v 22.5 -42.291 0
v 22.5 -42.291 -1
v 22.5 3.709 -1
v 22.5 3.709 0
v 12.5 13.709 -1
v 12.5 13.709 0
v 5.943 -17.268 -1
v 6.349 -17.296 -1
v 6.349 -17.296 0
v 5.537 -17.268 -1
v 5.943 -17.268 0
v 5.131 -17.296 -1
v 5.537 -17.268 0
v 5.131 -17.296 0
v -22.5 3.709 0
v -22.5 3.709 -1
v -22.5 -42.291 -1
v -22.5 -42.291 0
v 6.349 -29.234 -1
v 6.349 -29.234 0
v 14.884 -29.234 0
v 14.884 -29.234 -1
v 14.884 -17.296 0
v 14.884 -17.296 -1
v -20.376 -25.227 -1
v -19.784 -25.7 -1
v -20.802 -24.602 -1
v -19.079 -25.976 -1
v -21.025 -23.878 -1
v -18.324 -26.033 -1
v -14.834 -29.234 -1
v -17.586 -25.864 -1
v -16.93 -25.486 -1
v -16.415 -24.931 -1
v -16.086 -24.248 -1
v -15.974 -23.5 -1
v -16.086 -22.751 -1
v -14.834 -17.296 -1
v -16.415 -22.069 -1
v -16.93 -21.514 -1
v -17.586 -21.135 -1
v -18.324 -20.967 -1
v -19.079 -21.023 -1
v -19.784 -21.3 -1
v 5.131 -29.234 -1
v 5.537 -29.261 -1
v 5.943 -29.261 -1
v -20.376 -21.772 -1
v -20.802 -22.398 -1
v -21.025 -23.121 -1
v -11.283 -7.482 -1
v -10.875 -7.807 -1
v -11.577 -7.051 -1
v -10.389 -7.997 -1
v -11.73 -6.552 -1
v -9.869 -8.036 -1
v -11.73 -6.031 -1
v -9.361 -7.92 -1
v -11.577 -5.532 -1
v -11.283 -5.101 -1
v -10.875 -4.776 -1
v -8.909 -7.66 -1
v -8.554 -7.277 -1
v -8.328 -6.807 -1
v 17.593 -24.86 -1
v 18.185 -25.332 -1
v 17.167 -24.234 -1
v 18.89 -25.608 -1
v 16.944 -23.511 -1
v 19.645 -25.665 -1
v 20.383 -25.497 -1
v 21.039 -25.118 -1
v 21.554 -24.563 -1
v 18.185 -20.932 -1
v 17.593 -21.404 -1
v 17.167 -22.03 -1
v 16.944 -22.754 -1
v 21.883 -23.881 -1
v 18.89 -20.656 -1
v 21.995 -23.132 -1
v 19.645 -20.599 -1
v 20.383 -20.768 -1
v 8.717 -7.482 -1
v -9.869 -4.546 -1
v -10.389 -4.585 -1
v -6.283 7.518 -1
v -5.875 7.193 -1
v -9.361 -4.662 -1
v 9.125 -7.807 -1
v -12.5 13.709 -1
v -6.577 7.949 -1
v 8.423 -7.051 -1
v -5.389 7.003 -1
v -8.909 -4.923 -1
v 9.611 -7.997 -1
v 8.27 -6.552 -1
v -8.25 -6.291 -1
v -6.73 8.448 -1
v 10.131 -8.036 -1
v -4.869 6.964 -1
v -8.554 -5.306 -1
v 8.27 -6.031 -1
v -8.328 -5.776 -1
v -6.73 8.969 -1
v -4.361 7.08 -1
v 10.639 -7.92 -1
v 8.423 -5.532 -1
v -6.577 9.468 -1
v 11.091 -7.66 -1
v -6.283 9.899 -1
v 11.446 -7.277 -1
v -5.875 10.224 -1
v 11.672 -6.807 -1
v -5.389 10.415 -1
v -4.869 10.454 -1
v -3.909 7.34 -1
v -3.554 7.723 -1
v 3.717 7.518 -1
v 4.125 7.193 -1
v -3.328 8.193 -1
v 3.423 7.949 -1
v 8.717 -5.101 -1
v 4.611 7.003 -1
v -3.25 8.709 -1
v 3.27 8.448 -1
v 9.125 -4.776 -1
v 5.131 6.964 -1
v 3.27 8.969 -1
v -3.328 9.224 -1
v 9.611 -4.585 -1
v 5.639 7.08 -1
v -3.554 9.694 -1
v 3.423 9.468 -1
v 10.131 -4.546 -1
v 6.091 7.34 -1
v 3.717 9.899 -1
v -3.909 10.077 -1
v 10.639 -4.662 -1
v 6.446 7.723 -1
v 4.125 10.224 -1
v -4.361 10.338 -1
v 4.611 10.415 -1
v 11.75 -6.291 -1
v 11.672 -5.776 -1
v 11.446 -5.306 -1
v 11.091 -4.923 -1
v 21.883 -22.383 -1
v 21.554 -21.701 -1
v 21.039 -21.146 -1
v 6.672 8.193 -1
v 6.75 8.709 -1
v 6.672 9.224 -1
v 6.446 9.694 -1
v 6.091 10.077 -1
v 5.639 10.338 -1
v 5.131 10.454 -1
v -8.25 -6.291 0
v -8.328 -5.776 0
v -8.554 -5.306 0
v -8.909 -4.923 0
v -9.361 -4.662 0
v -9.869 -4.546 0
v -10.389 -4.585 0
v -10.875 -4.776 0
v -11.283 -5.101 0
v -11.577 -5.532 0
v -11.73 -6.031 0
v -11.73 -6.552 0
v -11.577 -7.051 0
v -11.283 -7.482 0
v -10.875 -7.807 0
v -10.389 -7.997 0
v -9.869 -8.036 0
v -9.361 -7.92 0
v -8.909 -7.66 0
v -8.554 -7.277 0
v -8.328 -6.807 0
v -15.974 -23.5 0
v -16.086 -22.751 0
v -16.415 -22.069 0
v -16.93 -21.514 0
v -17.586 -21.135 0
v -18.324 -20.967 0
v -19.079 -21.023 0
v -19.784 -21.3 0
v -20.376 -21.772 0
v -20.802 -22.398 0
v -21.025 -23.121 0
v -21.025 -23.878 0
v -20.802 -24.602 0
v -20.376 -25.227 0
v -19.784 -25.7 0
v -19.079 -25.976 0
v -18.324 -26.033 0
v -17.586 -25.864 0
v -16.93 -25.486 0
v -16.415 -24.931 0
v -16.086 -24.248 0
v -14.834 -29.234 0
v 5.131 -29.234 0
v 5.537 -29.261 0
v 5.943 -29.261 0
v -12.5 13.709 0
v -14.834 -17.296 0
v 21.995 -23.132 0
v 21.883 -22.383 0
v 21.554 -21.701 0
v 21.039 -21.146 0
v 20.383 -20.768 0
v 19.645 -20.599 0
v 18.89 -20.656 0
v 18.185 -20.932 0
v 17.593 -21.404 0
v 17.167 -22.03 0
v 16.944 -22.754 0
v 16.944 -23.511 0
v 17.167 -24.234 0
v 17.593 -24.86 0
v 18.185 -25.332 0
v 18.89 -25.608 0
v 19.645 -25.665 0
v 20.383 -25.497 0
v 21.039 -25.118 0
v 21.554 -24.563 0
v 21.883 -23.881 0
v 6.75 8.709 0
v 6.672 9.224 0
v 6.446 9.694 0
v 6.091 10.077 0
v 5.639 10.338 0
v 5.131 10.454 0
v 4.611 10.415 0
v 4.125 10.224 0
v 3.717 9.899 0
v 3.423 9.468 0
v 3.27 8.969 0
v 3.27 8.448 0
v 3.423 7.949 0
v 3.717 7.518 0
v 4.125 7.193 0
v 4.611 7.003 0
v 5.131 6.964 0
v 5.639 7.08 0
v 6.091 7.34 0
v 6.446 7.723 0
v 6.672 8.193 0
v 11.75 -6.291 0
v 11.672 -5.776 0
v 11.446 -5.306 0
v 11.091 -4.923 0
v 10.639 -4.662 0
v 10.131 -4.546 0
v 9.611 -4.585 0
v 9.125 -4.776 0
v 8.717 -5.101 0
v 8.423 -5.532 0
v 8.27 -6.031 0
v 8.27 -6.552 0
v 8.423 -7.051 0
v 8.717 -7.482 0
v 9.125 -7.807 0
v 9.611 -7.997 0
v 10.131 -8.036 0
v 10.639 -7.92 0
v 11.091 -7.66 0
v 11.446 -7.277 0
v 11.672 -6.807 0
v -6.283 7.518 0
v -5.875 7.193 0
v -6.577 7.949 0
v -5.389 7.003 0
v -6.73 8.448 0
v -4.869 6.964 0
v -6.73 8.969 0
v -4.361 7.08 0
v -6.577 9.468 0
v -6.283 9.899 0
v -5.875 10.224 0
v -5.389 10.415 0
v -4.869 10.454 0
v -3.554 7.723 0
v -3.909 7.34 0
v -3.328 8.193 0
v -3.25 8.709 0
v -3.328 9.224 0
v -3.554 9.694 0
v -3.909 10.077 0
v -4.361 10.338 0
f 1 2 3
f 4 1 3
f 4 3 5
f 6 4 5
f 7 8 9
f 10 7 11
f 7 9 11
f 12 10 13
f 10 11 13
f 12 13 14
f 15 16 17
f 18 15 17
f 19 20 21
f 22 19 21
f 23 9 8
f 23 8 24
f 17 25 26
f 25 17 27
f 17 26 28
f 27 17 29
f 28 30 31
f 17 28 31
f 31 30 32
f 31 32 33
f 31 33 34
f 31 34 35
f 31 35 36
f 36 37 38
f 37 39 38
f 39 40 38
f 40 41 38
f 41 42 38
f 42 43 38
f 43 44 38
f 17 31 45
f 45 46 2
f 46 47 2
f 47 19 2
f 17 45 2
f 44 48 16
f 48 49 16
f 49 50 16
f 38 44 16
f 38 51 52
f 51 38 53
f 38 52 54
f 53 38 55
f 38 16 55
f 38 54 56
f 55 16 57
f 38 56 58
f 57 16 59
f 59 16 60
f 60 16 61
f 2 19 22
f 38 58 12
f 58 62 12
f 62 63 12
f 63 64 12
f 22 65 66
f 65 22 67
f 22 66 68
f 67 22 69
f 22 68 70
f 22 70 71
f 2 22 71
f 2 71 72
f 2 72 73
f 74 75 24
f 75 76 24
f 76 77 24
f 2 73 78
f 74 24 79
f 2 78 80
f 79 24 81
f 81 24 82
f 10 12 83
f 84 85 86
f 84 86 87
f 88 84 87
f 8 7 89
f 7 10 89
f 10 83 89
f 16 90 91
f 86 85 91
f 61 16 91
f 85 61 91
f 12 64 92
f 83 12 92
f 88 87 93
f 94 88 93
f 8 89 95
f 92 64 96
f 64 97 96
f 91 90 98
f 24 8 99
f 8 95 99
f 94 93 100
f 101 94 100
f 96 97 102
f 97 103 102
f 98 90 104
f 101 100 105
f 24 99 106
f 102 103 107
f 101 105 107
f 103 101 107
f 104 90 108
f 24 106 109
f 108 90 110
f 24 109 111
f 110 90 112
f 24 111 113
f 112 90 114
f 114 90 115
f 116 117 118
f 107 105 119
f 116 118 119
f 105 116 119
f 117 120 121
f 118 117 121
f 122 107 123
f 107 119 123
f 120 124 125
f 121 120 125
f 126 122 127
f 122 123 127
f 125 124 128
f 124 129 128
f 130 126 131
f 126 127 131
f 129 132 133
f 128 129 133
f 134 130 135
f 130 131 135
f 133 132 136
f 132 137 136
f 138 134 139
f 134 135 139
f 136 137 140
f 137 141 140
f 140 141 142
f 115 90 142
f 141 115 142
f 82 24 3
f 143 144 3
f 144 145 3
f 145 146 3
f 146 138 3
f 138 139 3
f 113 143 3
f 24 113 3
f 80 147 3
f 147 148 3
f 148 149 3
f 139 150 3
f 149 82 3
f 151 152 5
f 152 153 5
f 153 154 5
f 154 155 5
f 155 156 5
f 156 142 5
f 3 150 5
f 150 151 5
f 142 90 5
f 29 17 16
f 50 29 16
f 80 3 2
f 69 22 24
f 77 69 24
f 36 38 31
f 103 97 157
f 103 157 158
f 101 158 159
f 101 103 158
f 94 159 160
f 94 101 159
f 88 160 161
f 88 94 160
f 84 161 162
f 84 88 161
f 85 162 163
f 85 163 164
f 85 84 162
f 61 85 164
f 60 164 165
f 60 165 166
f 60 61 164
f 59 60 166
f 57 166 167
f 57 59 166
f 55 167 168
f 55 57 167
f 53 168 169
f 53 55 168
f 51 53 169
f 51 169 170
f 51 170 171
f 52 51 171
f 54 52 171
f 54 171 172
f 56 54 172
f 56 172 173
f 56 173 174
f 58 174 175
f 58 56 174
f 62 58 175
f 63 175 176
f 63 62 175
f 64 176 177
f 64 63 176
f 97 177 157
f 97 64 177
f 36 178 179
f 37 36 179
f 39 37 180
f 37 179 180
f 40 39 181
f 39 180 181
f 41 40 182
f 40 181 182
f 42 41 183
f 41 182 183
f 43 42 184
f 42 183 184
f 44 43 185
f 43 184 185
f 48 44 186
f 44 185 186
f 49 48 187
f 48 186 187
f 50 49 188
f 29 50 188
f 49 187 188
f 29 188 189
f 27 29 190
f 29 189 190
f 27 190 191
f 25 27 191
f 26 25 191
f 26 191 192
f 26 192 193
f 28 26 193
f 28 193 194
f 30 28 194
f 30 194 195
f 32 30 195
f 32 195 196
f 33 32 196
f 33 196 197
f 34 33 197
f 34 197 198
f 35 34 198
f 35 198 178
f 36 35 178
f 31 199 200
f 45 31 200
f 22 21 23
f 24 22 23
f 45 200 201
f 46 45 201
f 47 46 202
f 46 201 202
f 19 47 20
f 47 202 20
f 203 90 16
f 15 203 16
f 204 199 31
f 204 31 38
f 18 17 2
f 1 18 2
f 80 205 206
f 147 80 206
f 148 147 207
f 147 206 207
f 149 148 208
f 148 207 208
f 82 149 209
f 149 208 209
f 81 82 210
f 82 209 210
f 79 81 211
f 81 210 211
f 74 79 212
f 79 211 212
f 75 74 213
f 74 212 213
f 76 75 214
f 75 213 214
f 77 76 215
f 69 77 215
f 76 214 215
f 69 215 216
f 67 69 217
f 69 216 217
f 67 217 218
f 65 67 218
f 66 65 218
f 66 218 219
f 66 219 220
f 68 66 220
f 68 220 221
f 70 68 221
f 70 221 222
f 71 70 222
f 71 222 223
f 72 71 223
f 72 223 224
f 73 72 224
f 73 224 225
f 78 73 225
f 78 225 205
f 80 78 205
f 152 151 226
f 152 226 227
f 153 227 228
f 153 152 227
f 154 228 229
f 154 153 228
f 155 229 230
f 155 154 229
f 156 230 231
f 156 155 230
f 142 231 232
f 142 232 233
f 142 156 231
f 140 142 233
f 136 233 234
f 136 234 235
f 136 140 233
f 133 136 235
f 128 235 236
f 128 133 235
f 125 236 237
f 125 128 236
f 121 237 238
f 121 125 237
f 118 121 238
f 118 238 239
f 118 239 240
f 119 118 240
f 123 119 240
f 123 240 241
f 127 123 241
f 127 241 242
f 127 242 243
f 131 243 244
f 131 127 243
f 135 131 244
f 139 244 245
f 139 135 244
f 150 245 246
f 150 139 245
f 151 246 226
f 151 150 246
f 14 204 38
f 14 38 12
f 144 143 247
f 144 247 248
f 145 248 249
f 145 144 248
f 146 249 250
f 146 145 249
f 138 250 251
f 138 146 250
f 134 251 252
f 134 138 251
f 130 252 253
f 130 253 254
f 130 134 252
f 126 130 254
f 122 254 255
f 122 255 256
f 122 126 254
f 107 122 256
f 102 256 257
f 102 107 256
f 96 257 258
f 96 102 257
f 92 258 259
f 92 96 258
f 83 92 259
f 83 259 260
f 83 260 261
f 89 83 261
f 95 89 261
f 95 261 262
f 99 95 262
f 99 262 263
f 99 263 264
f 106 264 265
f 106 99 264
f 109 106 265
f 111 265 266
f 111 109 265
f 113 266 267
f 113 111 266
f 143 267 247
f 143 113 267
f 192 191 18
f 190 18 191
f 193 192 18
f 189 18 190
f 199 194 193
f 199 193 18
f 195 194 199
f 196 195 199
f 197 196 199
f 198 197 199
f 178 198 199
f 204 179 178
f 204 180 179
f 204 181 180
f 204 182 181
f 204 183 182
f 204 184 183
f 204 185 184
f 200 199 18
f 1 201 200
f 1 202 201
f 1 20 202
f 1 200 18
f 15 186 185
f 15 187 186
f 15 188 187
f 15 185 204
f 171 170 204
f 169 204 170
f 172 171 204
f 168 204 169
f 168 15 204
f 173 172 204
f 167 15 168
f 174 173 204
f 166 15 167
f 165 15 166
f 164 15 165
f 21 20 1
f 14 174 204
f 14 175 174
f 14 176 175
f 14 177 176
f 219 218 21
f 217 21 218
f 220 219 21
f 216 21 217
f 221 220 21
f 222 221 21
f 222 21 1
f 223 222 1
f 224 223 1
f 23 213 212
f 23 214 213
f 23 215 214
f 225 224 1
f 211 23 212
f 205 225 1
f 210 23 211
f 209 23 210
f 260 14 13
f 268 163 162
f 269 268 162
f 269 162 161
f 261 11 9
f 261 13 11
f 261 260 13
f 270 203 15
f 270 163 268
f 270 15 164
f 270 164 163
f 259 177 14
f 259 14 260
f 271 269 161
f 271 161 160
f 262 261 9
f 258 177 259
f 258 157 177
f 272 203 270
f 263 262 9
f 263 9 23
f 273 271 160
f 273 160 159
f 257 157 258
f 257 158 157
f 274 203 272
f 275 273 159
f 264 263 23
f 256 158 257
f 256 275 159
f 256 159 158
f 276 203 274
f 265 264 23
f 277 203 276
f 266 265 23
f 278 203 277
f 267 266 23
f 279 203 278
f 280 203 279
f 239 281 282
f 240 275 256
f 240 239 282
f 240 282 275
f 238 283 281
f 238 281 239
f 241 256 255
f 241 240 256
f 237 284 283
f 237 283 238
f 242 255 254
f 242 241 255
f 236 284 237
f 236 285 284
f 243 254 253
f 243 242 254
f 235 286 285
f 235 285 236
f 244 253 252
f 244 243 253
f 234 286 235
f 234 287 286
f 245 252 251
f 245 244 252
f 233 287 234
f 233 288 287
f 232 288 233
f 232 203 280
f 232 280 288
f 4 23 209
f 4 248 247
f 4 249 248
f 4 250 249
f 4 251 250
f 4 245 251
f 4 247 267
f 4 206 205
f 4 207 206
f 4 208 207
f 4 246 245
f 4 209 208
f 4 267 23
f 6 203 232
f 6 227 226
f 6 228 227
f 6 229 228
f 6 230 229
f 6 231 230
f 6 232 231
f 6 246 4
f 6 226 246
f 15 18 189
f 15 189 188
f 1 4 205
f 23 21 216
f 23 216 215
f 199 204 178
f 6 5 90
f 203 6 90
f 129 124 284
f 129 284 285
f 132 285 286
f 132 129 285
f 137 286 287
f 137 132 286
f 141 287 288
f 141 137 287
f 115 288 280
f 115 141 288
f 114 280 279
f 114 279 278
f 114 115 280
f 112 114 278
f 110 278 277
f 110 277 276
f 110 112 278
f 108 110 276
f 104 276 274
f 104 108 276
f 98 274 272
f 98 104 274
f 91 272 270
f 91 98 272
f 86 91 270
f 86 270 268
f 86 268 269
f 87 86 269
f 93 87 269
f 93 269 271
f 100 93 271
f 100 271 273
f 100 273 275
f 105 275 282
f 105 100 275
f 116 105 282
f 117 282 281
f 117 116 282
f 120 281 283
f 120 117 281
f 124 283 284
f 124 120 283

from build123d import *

# Parameters (mm, degrees)
PIASTRAOUT_ESTRUSIONE_ESTRUSIONE1_START  = -1
PIASTRAOUT_ESTRUSIONE_ESTRUSIONE1_OUTL_R = 1.75
PIASTRAOUT_ESTRUSIONE_ESTRUSIONE1_DEPTH  = 1
SCHIZZO1_R                               = 6
TAGLIO_ESTRUSIONE1_DEPTH                 = 48.914602295
SCHIZZO2_R                               = 2.54
TAGLIO_ESTRUSIONE2_DEPTH                 = 48.914602295
SCHIZZO3_W                               = 29.718
SCHIZZO3_H                               = 11.938
TAGLIO_ESTRUSIONE3_DEPTH                 = 48.914602295


# Read off the part's stored shape, not the designer's step: <PiastraOUT>-<Estrusione-Estrusione1>
with BuildPart() as part:
    # <PiastraOUT>-<Estrusione-Estrusione1> outl → <PiastraOUT>-<Estrusione-Estrusione1> (new body)
    with BuildSketch(Plane.XY.offset(PIASTRAOUT_ESTRUSIONE_ESTRUSIONE1_START)):
        Polygon((-22.5, 3.708640208), (-22.5, -42.291359792), (22.5, -42.291359792), (22.5, 3.708640208), (12.5, 13.708640208), (-12.5, 13.708640208), align=None)
        with Locations((-10, -6.291359792)):
            Circle(PIASTRAOUT_ESTRUSIONE_ESTRUSIONE1_OUTL_R, mode=Mode.SUBTRACT)
        with Locations((-5, 8.708640208)):
            Circle(PIASTRAOUT_ESTRUSIONE_ESTRUSIONE1_OUTL_R, mode=Mode.SUBTRACT)
        with Locations((10, -6.291359792)):
            Circle(PIASTRAOUT_ESTRUSIONE_ESTRUSIONE1_OUTL_R, mode=Mode.SUBTRACT)
        with Locations((5, 8.708640208)):
            Circle(PIASTRAOUT_ESTRUSIONE_ESTRUSIONE1_OUTL_R, mode=Mode.SUBTRACT)
    extrude(amount=PIASTRAOUT_ESTRUSIONE_ESTRUSIONE1_DEPTH)

    # Schizzo1 → Taglio-Estrusione1 (cut, through all)
    with BuildSketch(Plane.XY):
        with Locations((5.74, -23.264939262)):
            Circle(SCHIZZO1_R)
    extrude(amount=-TAGLIO_ESTRUSIONE1_DEPTH, mode=Mode.SUBTRACT)

    # Schizzo2 → Taglio-Estrusione2 (cut, through all)
    with BuildSketch(Plane.XY):
        with Locations((-18.513603064, -23.499799375)):
            Circle(SCHIZZO2_R)
        with Locations((19.455356967, -23.132126406)):
            Circle(SCHIZZO2_R)
    extrude(amount=-TAGLIO_ESTRUSIONE2_DEPTH, mode=Mode.SUBTRACT)

    # Schizzo3 → Taglio-Estrusione3 (cut, through all)
    with BuildSketch(Plane.XY):
        with Locations((0.025, -23.264939262)):
            Rectangle(SCHIZZO3_W, SCHIZZO3_H)
    extrude(amount=-TAGLIO_ESTRUSIONE3_DEPTH, mode=Mode.SUBTRACT)


solid = part.part
